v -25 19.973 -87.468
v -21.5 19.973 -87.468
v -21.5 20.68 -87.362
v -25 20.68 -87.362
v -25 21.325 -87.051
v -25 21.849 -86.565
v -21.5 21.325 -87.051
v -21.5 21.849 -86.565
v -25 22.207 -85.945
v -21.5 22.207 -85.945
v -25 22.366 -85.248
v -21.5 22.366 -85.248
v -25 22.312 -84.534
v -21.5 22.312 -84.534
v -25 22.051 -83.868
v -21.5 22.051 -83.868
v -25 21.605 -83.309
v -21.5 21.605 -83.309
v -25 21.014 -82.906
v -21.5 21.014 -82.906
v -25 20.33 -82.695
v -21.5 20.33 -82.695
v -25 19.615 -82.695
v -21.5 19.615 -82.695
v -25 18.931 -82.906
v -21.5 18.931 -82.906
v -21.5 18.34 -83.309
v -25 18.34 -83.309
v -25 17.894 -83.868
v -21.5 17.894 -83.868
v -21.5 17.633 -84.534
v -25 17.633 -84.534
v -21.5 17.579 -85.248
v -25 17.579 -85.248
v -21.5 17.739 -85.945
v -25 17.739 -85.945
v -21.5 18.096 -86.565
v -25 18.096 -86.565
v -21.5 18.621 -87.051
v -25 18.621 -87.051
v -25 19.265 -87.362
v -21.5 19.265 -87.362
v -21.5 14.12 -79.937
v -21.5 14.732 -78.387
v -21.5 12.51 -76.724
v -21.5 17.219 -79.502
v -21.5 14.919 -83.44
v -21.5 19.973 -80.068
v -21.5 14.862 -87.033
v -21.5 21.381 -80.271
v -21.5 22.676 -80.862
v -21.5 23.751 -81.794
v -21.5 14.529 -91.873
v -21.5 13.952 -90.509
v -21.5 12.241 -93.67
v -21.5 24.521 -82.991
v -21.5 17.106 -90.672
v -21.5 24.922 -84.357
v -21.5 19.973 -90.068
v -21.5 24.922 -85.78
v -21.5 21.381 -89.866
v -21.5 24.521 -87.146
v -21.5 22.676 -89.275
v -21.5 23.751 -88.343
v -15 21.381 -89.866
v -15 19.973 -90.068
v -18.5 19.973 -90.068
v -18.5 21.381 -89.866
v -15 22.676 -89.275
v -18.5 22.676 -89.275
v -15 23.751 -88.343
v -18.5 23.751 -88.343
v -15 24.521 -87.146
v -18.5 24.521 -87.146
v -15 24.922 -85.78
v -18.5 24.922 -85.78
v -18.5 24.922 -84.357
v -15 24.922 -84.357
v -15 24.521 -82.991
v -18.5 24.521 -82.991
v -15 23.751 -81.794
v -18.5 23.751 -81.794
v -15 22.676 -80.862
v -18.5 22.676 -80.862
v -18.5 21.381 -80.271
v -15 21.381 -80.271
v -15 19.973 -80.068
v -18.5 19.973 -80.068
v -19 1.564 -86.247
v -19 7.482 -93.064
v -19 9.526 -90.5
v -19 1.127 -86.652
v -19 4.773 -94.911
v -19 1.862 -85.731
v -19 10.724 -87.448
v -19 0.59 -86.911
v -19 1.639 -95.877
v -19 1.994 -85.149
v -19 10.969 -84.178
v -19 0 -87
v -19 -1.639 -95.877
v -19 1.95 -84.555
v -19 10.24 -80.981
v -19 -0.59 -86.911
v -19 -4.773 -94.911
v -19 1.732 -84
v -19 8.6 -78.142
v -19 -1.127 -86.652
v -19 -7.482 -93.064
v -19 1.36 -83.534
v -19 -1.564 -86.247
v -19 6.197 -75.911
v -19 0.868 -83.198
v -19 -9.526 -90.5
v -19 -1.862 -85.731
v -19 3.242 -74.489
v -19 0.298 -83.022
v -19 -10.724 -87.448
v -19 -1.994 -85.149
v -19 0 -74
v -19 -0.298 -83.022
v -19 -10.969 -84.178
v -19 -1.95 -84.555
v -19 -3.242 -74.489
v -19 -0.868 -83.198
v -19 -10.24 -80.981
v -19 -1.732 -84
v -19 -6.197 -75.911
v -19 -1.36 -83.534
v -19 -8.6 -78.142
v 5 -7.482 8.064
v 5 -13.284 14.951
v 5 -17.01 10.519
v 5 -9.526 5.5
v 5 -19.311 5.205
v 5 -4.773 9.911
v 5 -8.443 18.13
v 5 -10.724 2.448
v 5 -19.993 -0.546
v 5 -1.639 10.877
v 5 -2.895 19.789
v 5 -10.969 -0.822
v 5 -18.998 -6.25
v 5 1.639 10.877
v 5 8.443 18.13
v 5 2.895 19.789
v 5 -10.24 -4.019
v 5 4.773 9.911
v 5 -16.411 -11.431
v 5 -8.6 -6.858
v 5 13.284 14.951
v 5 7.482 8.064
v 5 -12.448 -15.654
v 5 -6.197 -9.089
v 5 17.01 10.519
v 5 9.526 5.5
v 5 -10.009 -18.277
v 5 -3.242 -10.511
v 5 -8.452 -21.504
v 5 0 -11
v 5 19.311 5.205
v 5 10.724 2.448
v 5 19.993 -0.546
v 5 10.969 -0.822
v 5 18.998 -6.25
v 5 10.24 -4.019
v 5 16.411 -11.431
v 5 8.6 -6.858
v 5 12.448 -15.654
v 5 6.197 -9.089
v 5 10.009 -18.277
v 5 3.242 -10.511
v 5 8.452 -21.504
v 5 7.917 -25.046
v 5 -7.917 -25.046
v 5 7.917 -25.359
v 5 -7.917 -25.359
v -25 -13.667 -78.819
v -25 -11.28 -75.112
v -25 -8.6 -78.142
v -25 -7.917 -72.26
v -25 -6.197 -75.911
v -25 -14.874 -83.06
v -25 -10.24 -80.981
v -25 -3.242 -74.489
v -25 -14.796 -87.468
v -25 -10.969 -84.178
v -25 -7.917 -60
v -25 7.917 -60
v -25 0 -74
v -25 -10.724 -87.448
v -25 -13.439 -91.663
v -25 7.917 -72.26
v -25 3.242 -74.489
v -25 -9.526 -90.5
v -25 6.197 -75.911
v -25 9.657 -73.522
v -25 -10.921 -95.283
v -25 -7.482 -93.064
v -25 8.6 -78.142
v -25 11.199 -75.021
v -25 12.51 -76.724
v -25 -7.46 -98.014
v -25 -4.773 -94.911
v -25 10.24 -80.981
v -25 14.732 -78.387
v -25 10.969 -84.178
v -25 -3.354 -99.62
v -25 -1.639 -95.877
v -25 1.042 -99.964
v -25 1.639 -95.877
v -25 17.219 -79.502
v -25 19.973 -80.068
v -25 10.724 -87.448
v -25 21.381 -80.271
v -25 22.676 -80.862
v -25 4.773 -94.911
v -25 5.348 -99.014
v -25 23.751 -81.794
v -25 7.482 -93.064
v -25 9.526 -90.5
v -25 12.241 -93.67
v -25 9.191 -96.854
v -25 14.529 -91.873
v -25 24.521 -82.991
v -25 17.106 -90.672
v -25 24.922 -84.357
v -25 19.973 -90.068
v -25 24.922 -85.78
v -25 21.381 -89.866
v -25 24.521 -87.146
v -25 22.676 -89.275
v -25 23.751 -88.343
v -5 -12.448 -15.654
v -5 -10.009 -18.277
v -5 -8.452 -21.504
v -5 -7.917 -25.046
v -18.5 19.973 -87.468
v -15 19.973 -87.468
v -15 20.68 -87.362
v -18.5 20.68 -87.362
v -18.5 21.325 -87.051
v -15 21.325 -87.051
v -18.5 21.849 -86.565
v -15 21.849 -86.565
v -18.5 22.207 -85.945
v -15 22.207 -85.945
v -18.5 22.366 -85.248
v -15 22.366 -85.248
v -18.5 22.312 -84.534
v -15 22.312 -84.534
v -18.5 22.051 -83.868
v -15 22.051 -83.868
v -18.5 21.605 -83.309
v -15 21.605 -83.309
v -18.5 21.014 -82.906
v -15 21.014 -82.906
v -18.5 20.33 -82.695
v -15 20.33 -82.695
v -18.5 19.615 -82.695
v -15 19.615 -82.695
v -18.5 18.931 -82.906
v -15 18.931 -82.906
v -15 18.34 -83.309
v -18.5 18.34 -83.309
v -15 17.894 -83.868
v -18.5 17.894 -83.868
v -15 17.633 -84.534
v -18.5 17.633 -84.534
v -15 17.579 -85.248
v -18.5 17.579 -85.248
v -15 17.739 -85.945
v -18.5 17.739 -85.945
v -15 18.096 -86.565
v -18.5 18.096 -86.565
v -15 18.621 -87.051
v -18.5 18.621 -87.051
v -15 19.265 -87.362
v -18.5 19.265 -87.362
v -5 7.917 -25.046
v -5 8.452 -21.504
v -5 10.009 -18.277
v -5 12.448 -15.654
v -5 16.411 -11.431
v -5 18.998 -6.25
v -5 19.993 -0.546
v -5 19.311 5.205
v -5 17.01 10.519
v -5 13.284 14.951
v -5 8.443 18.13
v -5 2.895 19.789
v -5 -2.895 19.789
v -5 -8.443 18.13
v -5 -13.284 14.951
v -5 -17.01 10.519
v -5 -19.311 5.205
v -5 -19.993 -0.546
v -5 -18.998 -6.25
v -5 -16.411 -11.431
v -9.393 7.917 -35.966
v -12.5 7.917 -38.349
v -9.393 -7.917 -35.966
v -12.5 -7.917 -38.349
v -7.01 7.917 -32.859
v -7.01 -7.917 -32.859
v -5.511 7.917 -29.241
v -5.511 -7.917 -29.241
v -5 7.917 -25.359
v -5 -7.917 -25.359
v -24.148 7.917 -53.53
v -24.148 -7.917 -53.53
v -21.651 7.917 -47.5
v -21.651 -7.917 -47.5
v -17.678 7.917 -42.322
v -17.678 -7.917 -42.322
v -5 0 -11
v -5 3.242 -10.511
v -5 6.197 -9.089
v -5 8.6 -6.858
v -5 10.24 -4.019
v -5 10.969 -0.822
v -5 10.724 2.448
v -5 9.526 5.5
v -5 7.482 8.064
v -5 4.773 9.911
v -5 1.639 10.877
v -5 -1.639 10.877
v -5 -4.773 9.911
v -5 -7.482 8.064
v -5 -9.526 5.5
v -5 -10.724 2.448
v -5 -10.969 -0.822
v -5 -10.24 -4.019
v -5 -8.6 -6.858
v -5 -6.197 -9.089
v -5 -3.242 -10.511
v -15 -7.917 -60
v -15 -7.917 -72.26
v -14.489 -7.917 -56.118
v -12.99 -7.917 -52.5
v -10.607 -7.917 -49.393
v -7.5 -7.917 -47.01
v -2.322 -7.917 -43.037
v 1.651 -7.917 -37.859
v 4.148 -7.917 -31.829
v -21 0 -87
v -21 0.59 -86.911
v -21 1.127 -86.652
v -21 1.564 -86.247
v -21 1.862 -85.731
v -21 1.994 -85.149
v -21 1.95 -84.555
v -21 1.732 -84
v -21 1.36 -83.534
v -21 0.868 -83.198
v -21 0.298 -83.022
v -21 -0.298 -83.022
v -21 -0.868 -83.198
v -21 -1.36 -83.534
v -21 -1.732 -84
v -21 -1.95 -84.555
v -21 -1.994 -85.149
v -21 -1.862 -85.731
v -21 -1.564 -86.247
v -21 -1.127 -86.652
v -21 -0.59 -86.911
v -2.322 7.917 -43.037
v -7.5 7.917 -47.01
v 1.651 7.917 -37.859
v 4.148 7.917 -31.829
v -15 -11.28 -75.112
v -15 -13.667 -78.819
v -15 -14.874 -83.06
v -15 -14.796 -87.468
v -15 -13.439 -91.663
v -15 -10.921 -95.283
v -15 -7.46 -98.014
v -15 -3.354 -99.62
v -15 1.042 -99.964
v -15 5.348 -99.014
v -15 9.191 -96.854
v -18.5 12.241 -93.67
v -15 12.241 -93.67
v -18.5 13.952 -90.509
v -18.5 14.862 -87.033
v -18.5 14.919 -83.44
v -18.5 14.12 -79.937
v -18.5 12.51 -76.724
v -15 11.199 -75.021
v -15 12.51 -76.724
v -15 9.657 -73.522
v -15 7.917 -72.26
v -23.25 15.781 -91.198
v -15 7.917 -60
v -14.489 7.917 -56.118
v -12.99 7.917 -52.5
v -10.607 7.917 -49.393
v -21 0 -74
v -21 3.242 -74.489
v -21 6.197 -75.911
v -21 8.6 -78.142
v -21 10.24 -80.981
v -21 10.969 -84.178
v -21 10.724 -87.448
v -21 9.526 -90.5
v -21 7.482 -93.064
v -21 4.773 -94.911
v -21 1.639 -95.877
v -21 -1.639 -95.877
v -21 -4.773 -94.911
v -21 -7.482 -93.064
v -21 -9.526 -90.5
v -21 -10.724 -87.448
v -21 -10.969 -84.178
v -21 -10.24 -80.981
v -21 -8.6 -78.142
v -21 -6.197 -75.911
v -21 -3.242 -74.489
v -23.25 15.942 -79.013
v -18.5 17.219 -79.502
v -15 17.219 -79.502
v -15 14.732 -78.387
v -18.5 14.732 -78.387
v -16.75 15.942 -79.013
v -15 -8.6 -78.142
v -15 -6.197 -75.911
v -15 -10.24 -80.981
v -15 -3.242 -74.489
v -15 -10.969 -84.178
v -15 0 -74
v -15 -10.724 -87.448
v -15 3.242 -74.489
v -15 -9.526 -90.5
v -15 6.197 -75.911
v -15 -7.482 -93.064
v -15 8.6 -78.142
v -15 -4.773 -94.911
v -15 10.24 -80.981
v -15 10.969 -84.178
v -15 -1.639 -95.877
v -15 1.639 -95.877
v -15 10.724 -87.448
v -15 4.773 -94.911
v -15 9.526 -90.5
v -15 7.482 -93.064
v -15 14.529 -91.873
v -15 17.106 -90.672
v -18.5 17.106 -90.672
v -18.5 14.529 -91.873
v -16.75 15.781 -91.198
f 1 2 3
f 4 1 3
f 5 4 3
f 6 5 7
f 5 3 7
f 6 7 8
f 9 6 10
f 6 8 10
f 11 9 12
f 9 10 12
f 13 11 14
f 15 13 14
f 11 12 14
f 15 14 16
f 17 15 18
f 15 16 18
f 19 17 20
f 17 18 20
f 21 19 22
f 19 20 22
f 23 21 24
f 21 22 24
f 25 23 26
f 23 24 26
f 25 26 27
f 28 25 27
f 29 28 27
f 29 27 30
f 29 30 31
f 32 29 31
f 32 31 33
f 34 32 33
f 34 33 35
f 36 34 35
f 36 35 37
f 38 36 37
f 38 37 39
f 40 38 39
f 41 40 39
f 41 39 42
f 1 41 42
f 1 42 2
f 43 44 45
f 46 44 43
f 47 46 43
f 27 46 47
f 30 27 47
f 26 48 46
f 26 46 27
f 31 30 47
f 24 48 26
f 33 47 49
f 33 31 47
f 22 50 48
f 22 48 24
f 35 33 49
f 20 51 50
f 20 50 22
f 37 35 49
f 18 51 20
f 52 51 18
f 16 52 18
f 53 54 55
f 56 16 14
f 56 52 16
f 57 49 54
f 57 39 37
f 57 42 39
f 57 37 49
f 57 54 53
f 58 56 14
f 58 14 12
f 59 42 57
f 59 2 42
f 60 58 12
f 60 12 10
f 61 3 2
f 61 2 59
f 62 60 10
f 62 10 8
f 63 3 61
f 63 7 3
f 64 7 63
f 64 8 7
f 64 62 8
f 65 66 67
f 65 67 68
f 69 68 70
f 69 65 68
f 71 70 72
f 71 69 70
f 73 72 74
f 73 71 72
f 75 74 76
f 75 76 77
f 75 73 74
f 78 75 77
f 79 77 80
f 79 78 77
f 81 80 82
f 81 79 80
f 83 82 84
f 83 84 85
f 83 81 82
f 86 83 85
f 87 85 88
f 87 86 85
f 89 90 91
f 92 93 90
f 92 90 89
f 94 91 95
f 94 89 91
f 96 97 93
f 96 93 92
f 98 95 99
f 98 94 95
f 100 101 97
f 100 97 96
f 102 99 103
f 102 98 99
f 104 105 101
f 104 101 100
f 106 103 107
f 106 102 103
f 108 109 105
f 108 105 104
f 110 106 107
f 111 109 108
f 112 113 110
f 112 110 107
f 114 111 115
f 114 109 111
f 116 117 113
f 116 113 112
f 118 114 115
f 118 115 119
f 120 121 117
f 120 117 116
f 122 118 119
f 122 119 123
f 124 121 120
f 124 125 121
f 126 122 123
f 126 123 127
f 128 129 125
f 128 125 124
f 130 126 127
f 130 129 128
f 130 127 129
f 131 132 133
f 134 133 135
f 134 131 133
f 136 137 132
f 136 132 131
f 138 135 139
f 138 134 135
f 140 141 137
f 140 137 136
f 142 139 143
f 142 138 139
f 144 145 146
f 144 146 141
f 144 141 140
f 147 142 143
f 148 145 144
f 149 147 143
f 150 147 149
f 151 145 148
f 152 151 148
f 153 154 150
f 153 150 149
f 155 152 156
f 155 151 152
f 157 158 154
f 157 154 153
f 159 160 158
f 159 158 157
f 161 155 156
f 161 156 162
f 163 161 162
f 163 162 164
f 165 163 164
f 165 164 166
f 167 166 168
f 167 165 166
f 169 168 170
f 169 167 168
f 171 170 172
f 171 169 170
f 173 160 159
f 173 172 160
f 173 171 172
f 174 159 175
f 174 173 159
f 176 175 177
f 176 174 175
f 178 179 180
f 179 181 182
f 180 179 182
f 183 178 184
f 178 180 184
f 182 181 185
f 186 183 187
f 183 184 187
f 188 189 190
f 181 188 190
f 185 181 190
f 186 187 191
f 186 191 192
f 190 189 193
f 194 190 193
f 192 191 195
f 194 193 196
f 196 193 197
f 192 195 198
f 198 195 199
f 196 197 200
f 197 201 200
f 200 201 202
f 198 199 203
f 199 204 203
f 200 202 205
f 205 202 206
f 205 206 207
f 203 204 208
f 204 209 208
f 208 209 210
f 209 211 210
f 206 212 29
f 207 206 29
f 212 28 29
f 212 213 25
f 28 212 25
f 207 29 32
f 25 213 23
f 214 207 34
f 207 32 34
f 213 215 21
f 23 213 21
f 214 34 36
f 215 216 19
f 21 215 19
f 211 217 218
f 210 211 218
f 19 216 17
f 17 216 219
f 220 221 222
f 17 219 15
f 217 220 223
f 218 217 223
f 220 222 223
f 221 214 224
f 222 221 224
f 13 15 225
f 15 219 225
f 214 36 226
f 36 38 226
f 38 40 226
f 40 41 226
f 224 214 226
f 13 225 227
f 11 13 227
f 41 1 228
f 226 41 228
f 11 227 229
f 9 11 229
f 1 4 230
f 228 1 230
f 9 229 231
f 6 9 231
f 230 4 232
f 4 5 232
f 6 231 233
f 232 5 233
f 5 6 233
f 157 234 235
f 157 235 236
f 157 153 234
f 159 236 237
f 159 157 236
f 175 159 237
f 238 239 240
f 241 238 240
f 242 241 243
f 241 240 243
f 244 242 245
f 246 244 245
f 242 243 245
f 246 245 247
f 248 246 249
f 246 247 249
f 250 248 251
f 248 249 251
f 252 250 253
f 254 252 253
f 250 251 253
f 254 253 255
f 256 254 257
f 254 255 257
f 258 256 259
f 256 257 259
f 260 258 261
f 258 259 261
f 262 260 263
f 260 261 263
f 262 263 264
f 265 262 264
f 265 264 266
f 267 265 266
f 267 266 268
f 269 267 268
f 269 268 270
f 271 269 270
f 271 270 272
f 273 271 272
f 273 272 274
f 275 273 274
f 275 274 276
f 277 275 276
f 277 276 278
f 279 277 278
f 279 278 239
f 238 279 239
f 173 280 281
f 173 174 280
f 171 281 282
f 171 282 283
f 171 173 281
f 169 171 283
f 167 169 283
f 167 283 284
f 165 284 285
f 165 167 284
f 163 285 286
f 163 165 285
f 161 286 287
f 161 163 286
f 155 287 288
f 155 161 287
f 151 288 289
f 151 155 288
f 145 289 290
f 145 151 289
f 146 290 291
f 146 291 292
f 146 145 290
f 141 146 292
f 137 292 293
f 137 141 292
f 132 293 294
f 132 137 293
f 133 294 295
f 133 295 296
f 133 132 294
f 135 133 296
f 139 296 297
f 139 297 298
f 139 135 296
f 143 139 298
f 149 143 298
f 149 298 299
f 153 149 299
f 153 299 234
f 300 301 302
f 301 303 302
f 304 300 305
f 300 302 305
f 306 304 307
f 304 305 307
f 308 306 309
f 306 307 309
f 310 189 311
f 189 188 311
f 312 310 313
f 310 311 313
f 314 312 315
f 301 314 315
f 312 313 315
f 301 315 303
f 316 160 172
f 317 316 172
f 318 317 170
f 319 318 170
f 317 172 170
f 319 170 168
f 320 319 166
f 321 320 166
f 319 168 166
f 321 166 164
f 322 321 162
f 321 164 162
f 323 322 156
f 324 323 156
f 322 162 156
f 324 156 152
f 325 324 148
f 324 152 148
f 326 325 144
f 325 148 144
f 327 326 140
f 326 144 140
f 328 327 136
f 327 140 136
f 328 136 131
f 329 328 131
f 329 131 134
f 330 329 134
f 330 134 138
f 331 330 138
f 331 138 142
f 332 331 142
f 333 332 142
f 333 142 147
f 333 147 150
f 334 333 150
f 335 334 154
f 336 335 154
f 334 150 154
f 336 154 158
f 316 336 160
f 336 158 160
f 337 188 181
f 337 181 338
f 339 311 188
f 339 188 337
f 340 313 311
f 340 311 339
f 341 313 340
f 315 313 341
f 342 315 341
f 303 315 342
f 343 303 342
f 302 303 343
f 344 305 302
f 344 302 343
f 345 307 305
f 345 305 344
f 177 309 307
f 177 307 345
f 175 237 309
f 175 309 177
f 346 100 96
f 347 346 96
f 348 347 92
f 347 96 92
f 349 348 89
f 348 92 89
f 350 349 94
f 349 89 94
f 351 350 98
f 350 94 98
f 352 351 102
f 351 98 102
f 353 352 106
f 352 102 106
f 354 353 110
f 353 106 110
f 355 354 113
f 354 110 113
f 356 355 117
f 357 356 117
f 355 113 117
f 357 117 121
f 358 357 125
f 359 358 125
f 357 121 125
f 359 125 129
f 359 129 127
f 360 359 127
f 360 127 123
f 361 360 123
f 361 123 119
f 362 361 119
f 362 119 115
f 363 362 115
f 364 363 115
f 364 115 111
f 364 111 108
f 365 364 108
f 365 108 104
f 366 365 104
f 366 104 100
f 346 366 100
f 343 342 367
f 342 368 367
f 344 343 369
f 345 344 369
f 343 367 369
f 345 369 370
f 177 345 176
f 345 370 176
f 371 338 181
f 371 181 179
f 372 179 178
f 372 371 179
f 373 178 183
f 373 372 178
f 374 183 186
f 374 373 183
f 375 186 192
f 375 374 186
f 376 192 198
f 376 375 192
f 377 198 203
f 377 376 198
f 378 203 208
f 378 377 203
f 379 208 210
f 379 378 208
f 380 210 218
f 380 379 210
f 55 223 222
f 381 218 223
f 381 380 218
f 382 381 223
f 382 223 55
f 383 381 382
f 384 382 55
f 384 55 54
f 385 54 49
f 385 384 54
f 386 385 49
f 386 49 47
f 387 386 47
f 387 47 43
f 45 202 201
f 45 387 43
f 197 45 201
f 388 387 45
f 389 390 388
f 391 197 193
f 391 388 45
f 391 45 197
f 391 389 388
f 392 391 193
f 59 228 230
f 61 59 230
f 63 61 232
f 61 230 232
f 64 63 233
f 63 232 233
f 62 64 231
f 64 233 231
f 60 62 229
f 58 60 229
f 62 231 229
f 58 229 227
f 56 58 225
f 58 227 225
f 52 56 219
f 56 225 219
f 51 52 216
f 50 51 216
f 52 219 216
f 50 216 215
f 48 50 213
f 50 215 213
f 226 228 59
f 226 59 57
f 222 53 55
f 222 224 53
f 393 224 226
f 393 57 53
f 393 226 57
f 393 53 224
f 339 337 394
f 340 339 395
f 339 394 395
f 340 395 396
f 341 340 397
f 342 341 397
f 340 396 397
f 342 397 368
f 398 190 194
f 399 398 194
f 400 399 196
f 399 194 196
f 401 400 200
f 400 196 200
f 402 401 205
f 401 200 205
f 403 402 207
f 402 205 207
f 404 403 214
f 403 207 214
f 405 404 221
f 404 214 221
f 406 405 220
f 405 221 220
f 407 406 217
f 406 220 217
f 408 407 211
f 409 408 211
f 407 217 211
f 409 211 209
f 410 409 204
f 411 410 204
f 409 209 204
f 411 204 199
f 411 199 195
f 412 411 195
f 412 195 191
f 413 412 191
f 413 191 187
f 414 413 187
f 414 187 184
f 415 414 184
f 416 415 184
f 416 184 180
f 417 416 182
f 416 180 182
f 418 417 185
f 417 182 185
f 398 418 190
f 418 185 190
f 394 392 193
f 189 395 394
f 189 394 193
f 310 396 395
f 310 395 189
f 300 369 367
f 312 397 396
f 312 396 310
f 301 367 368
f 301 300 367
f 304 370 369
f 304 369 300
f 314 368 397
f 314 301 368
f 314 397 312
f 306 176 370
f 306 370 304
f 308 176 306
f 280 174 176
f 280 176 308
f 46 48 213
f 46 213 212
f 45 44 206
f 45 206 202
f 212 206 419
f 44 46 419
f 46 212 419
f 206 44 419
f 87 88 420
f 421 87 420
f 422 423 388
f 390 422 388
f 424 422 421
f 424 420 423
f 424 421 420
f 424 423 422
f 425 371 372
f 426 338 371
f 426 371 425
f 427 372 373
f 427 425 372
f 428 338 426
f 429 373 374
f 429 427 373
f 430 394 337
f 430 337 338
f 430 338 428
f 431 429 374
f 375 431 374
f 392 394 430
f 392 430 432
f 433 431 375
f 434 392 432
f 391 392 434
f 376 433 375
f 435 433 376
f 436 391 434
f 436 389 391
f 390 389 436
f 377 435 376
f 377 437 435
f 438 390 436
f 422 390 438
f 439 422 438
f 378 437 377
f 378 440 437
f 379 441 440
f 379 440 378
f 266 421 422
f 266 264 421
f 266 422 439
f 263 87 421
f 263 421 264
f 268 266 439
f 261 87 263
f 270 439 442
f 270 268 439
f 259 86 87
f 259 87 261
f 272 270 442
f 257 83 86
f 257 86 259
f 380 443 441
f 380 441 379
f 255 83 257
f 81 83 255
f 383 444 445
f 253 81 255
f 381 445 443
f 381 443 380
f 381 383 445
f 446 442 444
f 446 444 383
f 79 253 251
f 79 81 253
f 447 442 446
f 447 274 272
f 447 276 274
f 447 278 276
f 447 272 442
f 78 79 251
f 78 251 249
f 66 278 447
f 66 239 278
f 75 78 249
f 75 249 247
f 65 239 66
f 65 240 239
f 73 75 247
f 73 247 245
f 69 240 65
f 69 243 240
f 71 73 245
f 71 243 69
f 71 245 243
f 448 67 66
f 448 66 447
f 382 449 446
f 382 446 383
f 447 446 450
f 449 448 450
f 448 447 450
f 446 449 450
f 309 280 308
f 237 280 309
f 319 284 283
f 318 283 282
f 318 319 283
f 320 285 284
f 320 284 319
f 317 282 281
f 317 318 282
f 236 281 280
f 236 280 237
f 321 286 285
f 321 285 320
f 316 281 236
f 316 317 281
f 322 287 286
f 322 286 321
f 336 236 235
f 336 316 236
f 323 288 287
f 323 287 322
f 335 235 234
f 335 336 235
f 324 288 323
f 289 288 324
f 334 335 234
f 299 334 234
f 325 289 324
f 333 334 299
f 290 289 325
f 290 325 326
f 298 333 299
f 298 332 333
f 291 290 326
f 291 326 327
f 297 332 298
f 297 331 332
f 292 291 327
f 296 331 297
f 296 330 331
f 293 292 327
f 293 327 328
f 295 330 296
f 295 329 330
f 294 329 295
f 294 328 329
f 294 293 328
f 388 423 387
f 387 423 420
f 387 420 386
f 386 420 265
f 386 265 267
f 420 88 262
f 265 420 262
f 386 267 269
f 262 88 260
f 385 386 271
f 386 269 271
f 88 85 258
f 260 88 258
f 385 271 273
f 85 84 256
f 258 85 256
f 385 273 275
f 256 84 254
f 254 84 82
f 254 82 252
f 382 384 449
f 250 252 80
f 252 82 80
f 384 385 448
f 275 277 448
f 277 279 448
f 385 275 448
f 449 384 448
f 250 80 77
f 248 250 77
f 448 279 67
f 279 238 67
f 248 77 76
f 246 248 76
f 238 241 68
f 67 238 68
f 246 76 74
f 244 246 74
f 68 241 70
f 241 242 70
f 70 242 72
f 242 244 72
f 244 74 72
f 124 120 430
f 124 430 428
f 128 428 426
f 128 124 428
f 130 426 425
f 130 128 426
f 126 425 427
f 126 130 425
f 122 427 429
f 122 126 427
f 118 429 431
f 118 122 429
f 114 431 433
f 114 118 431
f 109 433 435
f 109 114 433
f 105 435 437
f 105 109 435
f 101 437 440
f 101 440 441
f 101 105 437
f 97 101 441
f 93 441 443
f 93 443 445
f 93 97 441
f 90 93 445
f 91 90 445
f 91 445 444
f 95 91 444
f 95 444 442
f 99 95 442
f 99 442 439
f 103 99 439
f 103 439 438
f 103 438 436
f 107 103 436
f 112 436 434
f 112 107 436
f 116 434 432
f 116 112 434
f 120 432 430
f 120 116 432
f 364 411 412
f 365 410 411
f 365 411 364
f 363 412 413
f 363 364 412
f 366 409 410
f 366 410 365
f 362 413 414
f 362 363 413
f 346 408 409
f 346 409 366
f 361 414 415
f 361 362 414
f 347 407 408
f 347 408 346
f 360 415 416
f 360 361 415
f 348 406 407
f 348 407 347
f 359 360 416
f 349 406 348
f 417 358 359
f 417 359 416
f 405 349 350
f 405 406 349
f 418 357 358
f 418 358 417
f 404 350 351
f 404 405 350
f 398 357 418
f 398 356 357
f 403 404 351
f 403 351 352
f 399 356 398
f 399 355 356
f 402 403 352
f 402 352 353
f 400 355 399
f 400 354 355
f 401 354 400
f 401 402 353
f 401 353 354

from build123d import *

# Parameters (mm, degrees)
CROQUIS2_W              = 10
CROQUIS2_H              = 15.834903248
CROQUIS4_R              = 15
SALIENTE_EXTRUIR1_DEPTH = 10
CROQUIS5_R              = 20
SALIENTE_EXTRUIR2_DEPTH = 10
SALIENTE_EXTRUIR5_DEPTH = 3.5
CROQUIS13_R             = 2.4
CORTAR_EXTRUIR1_DEPTH   = 10
CROQUIS7_R              = 11
CORTAR_EXTRUIR3_DEPTH   = 10
REDONDEO2_R             = 12
REDONDEO3_R             = 12
CROQUIS14_R             = 11
CORTAR_EXTRUIR4_DEPTH   = 4
CROQUIS6_R              = 2
CORTAR_EXTRUIR5_DEPTH   = 6
CORTAR_EXTRUIR6_START   = -4
CROQUIS15_R             = 11
CORTAR_EXTRUIR6_DEPTH   = 4


with BuildPart() as part:
    # Barrer1: sweep along a path in Croquis1
    with BuildLine(Plane(origin=(0, 0, 0), x_dir=(1, 0, 0), z_dir=(0, 1, 0))) as barrer1_path:
        Line((-20, 85), (-20, 60))
        ThreePointArc((-20, 60), (-17.320508076, 50), (-10, 42.679491924))
        ThreePointArc((-10, 42.679491924), (-2.679491924, 35.358983849), (0, 25.358983849))
        Line((0, 25.358983849), (0, 0))
    # Croquis2 → Barrer1 (sweep)
    with BuildSketch(Plane.XY):
        Rectangle(CROQUIS2_W, CROQUIS2_H)
    sweep(path=barrer1_path.line)

    # Croquis4 → Saliente-Extruir1 (add)
    with BuildSketch(Plane(origin=(-15, 0, 0), x_dir=(0, 0, -1), z_dir=(1, 0, 0))):
        with Locations((85, 0)):
            Circle(CROQUIS4_R)
    extrude(amount=-SALIENTE_EXTRUIR1_DEPTH)

    # Croquis5 → Saliente-Extruir2 (add)
    with BuildSketch(Plane(origin=(5, 0, 0), x_dir=(0, 0, -1), z_dir=(1, 0, 0))):
        Circle(CROQUIS5_R)
    extrude(amount=-SALIENTE_EXTRUIR2_DEPTH)

    # Croquis12 → Saliente-Extruir5 (add)
    with BuildSketch(Plane(origin=(-15, 0, 0), x_dir=(0, 0, -1), z_dir=(1, 0, 0))):
        with BuildLine():
            ThreePointArc((90.068496439, 19.972615481), (85.068496439, 24.972615481), (80.068496439, 19.972615481))
            add(Edge.make_bspline(
                [(80.068496439, 19.972615481), (79.566731031, 15.028252388), (75.848465439, 11.643922813)],
                knots=[0, 0, 0, 1, 1, 1], degree=2))
            ThreePointArc((75.848465439, 11.643922813), (85.068496439, 14.846363713), (94.288527439, 11.643922813))
            add(Edge.make_bspline(
                [(90.068496439, 19.972615481), (90.570261847, 15.028252388), (94.288527439, 11.643922813)],
                knots=[0, 0, 0, 1, 1, 1], degree=2))
        make_face()
    saliente_extruir5 = extrude(amount=-SALIENTE_EXTRUIR5_DEPTH)

    # Simetría1: Saliente-Extruir5 across plane
    add(saliente_extruir5.mirror(Plane(origin=(-20, 0, 0), x_dir=(0, 0, 1), z_dir=(1, 0, 0))))

    # Croquis13 → Cortar-Extruir1 (cut)
    with BuildSketch(Plane(origin=(-15, 0, 0), x_dir=(0, 0, -1), z_dir=(1, 0, 0))):
        with Locations((85.068496439, 19.972615481)):
            Circle(CROQUIS13_R)
    extrude(amount=-CORTAR_EXTRUIR1_DEPTH, mode=Mode.SUBTRACT)

    # Croquis7 → Cortar-Extruir3 (cut)
    with BuildSketch(Plane(origin=(5, 0, 0), x_dir=(0, 0, -1), z_dir=(1, 0, 0))):
        Circle(CROQUIS7_R)
    extrude(amount=-CORTAR_EXTRUIR3_DEPTH, mode=Mode.SUBTRACT)

    # Redondeo2
    redondeo2_edges = [part.edges().sort_by_distance(p)[0] for p in [
        (0, 7.917451624, -18.366108999),
    ]]
    fillet(redondeo2_edges, radius=REDONDEO2_R)

    # Redondeo3
    redondeo3_edges = [part.edges().sort_by_distance(p)[0] for p in [
        (0, -7.917451624, -18.366108999),
    ]]
    fillet(redondeo3_edges, radius=REDONDEO3_R)

    # Croquis14 → Cortar-Extruir4 (cut)
    with BuildSketch(Plane.ZY.offset(25)):
        with Locations((-85, 0)):
            Circle(CROQUIS14_R)
    extrude(amount=-CORTAR_EXTRUIR4_DEPTH, mode=Mode.SUBTRACT)

    # Croquis6 → Cortar-Extruir5 (cut)
    with BuildSketch(Plane(origin=(-15, 0, 0), x_dir=(0, 0, -1), z_dir=(1, 0, 0))):
        with Locations((85, 0)):
            Circle(CROQUIS6_R)
    extrude(amount=-CORTAR_EXTRUIR5_DEPTH, mode=Mode.SUBTRACT)

    # Croquis15 → Cortar-Extruir6 (cut)
    with BuildSketch(Plane(origin=(-15, 0, 0), x_dir=(0, 0, -1), z_dir=(1, 0, 0)).offset(CORTAR_EXTRUIR6_START)):
        with Locations(Location((85, 0, 0), (0, 0, 180))):
            Circle(CROQUIS15_R)
    extrude(amount=CORTAR_EXTRUIR6_DEPTH, mode=Mode.SUBTRACT)


solid = part.part
